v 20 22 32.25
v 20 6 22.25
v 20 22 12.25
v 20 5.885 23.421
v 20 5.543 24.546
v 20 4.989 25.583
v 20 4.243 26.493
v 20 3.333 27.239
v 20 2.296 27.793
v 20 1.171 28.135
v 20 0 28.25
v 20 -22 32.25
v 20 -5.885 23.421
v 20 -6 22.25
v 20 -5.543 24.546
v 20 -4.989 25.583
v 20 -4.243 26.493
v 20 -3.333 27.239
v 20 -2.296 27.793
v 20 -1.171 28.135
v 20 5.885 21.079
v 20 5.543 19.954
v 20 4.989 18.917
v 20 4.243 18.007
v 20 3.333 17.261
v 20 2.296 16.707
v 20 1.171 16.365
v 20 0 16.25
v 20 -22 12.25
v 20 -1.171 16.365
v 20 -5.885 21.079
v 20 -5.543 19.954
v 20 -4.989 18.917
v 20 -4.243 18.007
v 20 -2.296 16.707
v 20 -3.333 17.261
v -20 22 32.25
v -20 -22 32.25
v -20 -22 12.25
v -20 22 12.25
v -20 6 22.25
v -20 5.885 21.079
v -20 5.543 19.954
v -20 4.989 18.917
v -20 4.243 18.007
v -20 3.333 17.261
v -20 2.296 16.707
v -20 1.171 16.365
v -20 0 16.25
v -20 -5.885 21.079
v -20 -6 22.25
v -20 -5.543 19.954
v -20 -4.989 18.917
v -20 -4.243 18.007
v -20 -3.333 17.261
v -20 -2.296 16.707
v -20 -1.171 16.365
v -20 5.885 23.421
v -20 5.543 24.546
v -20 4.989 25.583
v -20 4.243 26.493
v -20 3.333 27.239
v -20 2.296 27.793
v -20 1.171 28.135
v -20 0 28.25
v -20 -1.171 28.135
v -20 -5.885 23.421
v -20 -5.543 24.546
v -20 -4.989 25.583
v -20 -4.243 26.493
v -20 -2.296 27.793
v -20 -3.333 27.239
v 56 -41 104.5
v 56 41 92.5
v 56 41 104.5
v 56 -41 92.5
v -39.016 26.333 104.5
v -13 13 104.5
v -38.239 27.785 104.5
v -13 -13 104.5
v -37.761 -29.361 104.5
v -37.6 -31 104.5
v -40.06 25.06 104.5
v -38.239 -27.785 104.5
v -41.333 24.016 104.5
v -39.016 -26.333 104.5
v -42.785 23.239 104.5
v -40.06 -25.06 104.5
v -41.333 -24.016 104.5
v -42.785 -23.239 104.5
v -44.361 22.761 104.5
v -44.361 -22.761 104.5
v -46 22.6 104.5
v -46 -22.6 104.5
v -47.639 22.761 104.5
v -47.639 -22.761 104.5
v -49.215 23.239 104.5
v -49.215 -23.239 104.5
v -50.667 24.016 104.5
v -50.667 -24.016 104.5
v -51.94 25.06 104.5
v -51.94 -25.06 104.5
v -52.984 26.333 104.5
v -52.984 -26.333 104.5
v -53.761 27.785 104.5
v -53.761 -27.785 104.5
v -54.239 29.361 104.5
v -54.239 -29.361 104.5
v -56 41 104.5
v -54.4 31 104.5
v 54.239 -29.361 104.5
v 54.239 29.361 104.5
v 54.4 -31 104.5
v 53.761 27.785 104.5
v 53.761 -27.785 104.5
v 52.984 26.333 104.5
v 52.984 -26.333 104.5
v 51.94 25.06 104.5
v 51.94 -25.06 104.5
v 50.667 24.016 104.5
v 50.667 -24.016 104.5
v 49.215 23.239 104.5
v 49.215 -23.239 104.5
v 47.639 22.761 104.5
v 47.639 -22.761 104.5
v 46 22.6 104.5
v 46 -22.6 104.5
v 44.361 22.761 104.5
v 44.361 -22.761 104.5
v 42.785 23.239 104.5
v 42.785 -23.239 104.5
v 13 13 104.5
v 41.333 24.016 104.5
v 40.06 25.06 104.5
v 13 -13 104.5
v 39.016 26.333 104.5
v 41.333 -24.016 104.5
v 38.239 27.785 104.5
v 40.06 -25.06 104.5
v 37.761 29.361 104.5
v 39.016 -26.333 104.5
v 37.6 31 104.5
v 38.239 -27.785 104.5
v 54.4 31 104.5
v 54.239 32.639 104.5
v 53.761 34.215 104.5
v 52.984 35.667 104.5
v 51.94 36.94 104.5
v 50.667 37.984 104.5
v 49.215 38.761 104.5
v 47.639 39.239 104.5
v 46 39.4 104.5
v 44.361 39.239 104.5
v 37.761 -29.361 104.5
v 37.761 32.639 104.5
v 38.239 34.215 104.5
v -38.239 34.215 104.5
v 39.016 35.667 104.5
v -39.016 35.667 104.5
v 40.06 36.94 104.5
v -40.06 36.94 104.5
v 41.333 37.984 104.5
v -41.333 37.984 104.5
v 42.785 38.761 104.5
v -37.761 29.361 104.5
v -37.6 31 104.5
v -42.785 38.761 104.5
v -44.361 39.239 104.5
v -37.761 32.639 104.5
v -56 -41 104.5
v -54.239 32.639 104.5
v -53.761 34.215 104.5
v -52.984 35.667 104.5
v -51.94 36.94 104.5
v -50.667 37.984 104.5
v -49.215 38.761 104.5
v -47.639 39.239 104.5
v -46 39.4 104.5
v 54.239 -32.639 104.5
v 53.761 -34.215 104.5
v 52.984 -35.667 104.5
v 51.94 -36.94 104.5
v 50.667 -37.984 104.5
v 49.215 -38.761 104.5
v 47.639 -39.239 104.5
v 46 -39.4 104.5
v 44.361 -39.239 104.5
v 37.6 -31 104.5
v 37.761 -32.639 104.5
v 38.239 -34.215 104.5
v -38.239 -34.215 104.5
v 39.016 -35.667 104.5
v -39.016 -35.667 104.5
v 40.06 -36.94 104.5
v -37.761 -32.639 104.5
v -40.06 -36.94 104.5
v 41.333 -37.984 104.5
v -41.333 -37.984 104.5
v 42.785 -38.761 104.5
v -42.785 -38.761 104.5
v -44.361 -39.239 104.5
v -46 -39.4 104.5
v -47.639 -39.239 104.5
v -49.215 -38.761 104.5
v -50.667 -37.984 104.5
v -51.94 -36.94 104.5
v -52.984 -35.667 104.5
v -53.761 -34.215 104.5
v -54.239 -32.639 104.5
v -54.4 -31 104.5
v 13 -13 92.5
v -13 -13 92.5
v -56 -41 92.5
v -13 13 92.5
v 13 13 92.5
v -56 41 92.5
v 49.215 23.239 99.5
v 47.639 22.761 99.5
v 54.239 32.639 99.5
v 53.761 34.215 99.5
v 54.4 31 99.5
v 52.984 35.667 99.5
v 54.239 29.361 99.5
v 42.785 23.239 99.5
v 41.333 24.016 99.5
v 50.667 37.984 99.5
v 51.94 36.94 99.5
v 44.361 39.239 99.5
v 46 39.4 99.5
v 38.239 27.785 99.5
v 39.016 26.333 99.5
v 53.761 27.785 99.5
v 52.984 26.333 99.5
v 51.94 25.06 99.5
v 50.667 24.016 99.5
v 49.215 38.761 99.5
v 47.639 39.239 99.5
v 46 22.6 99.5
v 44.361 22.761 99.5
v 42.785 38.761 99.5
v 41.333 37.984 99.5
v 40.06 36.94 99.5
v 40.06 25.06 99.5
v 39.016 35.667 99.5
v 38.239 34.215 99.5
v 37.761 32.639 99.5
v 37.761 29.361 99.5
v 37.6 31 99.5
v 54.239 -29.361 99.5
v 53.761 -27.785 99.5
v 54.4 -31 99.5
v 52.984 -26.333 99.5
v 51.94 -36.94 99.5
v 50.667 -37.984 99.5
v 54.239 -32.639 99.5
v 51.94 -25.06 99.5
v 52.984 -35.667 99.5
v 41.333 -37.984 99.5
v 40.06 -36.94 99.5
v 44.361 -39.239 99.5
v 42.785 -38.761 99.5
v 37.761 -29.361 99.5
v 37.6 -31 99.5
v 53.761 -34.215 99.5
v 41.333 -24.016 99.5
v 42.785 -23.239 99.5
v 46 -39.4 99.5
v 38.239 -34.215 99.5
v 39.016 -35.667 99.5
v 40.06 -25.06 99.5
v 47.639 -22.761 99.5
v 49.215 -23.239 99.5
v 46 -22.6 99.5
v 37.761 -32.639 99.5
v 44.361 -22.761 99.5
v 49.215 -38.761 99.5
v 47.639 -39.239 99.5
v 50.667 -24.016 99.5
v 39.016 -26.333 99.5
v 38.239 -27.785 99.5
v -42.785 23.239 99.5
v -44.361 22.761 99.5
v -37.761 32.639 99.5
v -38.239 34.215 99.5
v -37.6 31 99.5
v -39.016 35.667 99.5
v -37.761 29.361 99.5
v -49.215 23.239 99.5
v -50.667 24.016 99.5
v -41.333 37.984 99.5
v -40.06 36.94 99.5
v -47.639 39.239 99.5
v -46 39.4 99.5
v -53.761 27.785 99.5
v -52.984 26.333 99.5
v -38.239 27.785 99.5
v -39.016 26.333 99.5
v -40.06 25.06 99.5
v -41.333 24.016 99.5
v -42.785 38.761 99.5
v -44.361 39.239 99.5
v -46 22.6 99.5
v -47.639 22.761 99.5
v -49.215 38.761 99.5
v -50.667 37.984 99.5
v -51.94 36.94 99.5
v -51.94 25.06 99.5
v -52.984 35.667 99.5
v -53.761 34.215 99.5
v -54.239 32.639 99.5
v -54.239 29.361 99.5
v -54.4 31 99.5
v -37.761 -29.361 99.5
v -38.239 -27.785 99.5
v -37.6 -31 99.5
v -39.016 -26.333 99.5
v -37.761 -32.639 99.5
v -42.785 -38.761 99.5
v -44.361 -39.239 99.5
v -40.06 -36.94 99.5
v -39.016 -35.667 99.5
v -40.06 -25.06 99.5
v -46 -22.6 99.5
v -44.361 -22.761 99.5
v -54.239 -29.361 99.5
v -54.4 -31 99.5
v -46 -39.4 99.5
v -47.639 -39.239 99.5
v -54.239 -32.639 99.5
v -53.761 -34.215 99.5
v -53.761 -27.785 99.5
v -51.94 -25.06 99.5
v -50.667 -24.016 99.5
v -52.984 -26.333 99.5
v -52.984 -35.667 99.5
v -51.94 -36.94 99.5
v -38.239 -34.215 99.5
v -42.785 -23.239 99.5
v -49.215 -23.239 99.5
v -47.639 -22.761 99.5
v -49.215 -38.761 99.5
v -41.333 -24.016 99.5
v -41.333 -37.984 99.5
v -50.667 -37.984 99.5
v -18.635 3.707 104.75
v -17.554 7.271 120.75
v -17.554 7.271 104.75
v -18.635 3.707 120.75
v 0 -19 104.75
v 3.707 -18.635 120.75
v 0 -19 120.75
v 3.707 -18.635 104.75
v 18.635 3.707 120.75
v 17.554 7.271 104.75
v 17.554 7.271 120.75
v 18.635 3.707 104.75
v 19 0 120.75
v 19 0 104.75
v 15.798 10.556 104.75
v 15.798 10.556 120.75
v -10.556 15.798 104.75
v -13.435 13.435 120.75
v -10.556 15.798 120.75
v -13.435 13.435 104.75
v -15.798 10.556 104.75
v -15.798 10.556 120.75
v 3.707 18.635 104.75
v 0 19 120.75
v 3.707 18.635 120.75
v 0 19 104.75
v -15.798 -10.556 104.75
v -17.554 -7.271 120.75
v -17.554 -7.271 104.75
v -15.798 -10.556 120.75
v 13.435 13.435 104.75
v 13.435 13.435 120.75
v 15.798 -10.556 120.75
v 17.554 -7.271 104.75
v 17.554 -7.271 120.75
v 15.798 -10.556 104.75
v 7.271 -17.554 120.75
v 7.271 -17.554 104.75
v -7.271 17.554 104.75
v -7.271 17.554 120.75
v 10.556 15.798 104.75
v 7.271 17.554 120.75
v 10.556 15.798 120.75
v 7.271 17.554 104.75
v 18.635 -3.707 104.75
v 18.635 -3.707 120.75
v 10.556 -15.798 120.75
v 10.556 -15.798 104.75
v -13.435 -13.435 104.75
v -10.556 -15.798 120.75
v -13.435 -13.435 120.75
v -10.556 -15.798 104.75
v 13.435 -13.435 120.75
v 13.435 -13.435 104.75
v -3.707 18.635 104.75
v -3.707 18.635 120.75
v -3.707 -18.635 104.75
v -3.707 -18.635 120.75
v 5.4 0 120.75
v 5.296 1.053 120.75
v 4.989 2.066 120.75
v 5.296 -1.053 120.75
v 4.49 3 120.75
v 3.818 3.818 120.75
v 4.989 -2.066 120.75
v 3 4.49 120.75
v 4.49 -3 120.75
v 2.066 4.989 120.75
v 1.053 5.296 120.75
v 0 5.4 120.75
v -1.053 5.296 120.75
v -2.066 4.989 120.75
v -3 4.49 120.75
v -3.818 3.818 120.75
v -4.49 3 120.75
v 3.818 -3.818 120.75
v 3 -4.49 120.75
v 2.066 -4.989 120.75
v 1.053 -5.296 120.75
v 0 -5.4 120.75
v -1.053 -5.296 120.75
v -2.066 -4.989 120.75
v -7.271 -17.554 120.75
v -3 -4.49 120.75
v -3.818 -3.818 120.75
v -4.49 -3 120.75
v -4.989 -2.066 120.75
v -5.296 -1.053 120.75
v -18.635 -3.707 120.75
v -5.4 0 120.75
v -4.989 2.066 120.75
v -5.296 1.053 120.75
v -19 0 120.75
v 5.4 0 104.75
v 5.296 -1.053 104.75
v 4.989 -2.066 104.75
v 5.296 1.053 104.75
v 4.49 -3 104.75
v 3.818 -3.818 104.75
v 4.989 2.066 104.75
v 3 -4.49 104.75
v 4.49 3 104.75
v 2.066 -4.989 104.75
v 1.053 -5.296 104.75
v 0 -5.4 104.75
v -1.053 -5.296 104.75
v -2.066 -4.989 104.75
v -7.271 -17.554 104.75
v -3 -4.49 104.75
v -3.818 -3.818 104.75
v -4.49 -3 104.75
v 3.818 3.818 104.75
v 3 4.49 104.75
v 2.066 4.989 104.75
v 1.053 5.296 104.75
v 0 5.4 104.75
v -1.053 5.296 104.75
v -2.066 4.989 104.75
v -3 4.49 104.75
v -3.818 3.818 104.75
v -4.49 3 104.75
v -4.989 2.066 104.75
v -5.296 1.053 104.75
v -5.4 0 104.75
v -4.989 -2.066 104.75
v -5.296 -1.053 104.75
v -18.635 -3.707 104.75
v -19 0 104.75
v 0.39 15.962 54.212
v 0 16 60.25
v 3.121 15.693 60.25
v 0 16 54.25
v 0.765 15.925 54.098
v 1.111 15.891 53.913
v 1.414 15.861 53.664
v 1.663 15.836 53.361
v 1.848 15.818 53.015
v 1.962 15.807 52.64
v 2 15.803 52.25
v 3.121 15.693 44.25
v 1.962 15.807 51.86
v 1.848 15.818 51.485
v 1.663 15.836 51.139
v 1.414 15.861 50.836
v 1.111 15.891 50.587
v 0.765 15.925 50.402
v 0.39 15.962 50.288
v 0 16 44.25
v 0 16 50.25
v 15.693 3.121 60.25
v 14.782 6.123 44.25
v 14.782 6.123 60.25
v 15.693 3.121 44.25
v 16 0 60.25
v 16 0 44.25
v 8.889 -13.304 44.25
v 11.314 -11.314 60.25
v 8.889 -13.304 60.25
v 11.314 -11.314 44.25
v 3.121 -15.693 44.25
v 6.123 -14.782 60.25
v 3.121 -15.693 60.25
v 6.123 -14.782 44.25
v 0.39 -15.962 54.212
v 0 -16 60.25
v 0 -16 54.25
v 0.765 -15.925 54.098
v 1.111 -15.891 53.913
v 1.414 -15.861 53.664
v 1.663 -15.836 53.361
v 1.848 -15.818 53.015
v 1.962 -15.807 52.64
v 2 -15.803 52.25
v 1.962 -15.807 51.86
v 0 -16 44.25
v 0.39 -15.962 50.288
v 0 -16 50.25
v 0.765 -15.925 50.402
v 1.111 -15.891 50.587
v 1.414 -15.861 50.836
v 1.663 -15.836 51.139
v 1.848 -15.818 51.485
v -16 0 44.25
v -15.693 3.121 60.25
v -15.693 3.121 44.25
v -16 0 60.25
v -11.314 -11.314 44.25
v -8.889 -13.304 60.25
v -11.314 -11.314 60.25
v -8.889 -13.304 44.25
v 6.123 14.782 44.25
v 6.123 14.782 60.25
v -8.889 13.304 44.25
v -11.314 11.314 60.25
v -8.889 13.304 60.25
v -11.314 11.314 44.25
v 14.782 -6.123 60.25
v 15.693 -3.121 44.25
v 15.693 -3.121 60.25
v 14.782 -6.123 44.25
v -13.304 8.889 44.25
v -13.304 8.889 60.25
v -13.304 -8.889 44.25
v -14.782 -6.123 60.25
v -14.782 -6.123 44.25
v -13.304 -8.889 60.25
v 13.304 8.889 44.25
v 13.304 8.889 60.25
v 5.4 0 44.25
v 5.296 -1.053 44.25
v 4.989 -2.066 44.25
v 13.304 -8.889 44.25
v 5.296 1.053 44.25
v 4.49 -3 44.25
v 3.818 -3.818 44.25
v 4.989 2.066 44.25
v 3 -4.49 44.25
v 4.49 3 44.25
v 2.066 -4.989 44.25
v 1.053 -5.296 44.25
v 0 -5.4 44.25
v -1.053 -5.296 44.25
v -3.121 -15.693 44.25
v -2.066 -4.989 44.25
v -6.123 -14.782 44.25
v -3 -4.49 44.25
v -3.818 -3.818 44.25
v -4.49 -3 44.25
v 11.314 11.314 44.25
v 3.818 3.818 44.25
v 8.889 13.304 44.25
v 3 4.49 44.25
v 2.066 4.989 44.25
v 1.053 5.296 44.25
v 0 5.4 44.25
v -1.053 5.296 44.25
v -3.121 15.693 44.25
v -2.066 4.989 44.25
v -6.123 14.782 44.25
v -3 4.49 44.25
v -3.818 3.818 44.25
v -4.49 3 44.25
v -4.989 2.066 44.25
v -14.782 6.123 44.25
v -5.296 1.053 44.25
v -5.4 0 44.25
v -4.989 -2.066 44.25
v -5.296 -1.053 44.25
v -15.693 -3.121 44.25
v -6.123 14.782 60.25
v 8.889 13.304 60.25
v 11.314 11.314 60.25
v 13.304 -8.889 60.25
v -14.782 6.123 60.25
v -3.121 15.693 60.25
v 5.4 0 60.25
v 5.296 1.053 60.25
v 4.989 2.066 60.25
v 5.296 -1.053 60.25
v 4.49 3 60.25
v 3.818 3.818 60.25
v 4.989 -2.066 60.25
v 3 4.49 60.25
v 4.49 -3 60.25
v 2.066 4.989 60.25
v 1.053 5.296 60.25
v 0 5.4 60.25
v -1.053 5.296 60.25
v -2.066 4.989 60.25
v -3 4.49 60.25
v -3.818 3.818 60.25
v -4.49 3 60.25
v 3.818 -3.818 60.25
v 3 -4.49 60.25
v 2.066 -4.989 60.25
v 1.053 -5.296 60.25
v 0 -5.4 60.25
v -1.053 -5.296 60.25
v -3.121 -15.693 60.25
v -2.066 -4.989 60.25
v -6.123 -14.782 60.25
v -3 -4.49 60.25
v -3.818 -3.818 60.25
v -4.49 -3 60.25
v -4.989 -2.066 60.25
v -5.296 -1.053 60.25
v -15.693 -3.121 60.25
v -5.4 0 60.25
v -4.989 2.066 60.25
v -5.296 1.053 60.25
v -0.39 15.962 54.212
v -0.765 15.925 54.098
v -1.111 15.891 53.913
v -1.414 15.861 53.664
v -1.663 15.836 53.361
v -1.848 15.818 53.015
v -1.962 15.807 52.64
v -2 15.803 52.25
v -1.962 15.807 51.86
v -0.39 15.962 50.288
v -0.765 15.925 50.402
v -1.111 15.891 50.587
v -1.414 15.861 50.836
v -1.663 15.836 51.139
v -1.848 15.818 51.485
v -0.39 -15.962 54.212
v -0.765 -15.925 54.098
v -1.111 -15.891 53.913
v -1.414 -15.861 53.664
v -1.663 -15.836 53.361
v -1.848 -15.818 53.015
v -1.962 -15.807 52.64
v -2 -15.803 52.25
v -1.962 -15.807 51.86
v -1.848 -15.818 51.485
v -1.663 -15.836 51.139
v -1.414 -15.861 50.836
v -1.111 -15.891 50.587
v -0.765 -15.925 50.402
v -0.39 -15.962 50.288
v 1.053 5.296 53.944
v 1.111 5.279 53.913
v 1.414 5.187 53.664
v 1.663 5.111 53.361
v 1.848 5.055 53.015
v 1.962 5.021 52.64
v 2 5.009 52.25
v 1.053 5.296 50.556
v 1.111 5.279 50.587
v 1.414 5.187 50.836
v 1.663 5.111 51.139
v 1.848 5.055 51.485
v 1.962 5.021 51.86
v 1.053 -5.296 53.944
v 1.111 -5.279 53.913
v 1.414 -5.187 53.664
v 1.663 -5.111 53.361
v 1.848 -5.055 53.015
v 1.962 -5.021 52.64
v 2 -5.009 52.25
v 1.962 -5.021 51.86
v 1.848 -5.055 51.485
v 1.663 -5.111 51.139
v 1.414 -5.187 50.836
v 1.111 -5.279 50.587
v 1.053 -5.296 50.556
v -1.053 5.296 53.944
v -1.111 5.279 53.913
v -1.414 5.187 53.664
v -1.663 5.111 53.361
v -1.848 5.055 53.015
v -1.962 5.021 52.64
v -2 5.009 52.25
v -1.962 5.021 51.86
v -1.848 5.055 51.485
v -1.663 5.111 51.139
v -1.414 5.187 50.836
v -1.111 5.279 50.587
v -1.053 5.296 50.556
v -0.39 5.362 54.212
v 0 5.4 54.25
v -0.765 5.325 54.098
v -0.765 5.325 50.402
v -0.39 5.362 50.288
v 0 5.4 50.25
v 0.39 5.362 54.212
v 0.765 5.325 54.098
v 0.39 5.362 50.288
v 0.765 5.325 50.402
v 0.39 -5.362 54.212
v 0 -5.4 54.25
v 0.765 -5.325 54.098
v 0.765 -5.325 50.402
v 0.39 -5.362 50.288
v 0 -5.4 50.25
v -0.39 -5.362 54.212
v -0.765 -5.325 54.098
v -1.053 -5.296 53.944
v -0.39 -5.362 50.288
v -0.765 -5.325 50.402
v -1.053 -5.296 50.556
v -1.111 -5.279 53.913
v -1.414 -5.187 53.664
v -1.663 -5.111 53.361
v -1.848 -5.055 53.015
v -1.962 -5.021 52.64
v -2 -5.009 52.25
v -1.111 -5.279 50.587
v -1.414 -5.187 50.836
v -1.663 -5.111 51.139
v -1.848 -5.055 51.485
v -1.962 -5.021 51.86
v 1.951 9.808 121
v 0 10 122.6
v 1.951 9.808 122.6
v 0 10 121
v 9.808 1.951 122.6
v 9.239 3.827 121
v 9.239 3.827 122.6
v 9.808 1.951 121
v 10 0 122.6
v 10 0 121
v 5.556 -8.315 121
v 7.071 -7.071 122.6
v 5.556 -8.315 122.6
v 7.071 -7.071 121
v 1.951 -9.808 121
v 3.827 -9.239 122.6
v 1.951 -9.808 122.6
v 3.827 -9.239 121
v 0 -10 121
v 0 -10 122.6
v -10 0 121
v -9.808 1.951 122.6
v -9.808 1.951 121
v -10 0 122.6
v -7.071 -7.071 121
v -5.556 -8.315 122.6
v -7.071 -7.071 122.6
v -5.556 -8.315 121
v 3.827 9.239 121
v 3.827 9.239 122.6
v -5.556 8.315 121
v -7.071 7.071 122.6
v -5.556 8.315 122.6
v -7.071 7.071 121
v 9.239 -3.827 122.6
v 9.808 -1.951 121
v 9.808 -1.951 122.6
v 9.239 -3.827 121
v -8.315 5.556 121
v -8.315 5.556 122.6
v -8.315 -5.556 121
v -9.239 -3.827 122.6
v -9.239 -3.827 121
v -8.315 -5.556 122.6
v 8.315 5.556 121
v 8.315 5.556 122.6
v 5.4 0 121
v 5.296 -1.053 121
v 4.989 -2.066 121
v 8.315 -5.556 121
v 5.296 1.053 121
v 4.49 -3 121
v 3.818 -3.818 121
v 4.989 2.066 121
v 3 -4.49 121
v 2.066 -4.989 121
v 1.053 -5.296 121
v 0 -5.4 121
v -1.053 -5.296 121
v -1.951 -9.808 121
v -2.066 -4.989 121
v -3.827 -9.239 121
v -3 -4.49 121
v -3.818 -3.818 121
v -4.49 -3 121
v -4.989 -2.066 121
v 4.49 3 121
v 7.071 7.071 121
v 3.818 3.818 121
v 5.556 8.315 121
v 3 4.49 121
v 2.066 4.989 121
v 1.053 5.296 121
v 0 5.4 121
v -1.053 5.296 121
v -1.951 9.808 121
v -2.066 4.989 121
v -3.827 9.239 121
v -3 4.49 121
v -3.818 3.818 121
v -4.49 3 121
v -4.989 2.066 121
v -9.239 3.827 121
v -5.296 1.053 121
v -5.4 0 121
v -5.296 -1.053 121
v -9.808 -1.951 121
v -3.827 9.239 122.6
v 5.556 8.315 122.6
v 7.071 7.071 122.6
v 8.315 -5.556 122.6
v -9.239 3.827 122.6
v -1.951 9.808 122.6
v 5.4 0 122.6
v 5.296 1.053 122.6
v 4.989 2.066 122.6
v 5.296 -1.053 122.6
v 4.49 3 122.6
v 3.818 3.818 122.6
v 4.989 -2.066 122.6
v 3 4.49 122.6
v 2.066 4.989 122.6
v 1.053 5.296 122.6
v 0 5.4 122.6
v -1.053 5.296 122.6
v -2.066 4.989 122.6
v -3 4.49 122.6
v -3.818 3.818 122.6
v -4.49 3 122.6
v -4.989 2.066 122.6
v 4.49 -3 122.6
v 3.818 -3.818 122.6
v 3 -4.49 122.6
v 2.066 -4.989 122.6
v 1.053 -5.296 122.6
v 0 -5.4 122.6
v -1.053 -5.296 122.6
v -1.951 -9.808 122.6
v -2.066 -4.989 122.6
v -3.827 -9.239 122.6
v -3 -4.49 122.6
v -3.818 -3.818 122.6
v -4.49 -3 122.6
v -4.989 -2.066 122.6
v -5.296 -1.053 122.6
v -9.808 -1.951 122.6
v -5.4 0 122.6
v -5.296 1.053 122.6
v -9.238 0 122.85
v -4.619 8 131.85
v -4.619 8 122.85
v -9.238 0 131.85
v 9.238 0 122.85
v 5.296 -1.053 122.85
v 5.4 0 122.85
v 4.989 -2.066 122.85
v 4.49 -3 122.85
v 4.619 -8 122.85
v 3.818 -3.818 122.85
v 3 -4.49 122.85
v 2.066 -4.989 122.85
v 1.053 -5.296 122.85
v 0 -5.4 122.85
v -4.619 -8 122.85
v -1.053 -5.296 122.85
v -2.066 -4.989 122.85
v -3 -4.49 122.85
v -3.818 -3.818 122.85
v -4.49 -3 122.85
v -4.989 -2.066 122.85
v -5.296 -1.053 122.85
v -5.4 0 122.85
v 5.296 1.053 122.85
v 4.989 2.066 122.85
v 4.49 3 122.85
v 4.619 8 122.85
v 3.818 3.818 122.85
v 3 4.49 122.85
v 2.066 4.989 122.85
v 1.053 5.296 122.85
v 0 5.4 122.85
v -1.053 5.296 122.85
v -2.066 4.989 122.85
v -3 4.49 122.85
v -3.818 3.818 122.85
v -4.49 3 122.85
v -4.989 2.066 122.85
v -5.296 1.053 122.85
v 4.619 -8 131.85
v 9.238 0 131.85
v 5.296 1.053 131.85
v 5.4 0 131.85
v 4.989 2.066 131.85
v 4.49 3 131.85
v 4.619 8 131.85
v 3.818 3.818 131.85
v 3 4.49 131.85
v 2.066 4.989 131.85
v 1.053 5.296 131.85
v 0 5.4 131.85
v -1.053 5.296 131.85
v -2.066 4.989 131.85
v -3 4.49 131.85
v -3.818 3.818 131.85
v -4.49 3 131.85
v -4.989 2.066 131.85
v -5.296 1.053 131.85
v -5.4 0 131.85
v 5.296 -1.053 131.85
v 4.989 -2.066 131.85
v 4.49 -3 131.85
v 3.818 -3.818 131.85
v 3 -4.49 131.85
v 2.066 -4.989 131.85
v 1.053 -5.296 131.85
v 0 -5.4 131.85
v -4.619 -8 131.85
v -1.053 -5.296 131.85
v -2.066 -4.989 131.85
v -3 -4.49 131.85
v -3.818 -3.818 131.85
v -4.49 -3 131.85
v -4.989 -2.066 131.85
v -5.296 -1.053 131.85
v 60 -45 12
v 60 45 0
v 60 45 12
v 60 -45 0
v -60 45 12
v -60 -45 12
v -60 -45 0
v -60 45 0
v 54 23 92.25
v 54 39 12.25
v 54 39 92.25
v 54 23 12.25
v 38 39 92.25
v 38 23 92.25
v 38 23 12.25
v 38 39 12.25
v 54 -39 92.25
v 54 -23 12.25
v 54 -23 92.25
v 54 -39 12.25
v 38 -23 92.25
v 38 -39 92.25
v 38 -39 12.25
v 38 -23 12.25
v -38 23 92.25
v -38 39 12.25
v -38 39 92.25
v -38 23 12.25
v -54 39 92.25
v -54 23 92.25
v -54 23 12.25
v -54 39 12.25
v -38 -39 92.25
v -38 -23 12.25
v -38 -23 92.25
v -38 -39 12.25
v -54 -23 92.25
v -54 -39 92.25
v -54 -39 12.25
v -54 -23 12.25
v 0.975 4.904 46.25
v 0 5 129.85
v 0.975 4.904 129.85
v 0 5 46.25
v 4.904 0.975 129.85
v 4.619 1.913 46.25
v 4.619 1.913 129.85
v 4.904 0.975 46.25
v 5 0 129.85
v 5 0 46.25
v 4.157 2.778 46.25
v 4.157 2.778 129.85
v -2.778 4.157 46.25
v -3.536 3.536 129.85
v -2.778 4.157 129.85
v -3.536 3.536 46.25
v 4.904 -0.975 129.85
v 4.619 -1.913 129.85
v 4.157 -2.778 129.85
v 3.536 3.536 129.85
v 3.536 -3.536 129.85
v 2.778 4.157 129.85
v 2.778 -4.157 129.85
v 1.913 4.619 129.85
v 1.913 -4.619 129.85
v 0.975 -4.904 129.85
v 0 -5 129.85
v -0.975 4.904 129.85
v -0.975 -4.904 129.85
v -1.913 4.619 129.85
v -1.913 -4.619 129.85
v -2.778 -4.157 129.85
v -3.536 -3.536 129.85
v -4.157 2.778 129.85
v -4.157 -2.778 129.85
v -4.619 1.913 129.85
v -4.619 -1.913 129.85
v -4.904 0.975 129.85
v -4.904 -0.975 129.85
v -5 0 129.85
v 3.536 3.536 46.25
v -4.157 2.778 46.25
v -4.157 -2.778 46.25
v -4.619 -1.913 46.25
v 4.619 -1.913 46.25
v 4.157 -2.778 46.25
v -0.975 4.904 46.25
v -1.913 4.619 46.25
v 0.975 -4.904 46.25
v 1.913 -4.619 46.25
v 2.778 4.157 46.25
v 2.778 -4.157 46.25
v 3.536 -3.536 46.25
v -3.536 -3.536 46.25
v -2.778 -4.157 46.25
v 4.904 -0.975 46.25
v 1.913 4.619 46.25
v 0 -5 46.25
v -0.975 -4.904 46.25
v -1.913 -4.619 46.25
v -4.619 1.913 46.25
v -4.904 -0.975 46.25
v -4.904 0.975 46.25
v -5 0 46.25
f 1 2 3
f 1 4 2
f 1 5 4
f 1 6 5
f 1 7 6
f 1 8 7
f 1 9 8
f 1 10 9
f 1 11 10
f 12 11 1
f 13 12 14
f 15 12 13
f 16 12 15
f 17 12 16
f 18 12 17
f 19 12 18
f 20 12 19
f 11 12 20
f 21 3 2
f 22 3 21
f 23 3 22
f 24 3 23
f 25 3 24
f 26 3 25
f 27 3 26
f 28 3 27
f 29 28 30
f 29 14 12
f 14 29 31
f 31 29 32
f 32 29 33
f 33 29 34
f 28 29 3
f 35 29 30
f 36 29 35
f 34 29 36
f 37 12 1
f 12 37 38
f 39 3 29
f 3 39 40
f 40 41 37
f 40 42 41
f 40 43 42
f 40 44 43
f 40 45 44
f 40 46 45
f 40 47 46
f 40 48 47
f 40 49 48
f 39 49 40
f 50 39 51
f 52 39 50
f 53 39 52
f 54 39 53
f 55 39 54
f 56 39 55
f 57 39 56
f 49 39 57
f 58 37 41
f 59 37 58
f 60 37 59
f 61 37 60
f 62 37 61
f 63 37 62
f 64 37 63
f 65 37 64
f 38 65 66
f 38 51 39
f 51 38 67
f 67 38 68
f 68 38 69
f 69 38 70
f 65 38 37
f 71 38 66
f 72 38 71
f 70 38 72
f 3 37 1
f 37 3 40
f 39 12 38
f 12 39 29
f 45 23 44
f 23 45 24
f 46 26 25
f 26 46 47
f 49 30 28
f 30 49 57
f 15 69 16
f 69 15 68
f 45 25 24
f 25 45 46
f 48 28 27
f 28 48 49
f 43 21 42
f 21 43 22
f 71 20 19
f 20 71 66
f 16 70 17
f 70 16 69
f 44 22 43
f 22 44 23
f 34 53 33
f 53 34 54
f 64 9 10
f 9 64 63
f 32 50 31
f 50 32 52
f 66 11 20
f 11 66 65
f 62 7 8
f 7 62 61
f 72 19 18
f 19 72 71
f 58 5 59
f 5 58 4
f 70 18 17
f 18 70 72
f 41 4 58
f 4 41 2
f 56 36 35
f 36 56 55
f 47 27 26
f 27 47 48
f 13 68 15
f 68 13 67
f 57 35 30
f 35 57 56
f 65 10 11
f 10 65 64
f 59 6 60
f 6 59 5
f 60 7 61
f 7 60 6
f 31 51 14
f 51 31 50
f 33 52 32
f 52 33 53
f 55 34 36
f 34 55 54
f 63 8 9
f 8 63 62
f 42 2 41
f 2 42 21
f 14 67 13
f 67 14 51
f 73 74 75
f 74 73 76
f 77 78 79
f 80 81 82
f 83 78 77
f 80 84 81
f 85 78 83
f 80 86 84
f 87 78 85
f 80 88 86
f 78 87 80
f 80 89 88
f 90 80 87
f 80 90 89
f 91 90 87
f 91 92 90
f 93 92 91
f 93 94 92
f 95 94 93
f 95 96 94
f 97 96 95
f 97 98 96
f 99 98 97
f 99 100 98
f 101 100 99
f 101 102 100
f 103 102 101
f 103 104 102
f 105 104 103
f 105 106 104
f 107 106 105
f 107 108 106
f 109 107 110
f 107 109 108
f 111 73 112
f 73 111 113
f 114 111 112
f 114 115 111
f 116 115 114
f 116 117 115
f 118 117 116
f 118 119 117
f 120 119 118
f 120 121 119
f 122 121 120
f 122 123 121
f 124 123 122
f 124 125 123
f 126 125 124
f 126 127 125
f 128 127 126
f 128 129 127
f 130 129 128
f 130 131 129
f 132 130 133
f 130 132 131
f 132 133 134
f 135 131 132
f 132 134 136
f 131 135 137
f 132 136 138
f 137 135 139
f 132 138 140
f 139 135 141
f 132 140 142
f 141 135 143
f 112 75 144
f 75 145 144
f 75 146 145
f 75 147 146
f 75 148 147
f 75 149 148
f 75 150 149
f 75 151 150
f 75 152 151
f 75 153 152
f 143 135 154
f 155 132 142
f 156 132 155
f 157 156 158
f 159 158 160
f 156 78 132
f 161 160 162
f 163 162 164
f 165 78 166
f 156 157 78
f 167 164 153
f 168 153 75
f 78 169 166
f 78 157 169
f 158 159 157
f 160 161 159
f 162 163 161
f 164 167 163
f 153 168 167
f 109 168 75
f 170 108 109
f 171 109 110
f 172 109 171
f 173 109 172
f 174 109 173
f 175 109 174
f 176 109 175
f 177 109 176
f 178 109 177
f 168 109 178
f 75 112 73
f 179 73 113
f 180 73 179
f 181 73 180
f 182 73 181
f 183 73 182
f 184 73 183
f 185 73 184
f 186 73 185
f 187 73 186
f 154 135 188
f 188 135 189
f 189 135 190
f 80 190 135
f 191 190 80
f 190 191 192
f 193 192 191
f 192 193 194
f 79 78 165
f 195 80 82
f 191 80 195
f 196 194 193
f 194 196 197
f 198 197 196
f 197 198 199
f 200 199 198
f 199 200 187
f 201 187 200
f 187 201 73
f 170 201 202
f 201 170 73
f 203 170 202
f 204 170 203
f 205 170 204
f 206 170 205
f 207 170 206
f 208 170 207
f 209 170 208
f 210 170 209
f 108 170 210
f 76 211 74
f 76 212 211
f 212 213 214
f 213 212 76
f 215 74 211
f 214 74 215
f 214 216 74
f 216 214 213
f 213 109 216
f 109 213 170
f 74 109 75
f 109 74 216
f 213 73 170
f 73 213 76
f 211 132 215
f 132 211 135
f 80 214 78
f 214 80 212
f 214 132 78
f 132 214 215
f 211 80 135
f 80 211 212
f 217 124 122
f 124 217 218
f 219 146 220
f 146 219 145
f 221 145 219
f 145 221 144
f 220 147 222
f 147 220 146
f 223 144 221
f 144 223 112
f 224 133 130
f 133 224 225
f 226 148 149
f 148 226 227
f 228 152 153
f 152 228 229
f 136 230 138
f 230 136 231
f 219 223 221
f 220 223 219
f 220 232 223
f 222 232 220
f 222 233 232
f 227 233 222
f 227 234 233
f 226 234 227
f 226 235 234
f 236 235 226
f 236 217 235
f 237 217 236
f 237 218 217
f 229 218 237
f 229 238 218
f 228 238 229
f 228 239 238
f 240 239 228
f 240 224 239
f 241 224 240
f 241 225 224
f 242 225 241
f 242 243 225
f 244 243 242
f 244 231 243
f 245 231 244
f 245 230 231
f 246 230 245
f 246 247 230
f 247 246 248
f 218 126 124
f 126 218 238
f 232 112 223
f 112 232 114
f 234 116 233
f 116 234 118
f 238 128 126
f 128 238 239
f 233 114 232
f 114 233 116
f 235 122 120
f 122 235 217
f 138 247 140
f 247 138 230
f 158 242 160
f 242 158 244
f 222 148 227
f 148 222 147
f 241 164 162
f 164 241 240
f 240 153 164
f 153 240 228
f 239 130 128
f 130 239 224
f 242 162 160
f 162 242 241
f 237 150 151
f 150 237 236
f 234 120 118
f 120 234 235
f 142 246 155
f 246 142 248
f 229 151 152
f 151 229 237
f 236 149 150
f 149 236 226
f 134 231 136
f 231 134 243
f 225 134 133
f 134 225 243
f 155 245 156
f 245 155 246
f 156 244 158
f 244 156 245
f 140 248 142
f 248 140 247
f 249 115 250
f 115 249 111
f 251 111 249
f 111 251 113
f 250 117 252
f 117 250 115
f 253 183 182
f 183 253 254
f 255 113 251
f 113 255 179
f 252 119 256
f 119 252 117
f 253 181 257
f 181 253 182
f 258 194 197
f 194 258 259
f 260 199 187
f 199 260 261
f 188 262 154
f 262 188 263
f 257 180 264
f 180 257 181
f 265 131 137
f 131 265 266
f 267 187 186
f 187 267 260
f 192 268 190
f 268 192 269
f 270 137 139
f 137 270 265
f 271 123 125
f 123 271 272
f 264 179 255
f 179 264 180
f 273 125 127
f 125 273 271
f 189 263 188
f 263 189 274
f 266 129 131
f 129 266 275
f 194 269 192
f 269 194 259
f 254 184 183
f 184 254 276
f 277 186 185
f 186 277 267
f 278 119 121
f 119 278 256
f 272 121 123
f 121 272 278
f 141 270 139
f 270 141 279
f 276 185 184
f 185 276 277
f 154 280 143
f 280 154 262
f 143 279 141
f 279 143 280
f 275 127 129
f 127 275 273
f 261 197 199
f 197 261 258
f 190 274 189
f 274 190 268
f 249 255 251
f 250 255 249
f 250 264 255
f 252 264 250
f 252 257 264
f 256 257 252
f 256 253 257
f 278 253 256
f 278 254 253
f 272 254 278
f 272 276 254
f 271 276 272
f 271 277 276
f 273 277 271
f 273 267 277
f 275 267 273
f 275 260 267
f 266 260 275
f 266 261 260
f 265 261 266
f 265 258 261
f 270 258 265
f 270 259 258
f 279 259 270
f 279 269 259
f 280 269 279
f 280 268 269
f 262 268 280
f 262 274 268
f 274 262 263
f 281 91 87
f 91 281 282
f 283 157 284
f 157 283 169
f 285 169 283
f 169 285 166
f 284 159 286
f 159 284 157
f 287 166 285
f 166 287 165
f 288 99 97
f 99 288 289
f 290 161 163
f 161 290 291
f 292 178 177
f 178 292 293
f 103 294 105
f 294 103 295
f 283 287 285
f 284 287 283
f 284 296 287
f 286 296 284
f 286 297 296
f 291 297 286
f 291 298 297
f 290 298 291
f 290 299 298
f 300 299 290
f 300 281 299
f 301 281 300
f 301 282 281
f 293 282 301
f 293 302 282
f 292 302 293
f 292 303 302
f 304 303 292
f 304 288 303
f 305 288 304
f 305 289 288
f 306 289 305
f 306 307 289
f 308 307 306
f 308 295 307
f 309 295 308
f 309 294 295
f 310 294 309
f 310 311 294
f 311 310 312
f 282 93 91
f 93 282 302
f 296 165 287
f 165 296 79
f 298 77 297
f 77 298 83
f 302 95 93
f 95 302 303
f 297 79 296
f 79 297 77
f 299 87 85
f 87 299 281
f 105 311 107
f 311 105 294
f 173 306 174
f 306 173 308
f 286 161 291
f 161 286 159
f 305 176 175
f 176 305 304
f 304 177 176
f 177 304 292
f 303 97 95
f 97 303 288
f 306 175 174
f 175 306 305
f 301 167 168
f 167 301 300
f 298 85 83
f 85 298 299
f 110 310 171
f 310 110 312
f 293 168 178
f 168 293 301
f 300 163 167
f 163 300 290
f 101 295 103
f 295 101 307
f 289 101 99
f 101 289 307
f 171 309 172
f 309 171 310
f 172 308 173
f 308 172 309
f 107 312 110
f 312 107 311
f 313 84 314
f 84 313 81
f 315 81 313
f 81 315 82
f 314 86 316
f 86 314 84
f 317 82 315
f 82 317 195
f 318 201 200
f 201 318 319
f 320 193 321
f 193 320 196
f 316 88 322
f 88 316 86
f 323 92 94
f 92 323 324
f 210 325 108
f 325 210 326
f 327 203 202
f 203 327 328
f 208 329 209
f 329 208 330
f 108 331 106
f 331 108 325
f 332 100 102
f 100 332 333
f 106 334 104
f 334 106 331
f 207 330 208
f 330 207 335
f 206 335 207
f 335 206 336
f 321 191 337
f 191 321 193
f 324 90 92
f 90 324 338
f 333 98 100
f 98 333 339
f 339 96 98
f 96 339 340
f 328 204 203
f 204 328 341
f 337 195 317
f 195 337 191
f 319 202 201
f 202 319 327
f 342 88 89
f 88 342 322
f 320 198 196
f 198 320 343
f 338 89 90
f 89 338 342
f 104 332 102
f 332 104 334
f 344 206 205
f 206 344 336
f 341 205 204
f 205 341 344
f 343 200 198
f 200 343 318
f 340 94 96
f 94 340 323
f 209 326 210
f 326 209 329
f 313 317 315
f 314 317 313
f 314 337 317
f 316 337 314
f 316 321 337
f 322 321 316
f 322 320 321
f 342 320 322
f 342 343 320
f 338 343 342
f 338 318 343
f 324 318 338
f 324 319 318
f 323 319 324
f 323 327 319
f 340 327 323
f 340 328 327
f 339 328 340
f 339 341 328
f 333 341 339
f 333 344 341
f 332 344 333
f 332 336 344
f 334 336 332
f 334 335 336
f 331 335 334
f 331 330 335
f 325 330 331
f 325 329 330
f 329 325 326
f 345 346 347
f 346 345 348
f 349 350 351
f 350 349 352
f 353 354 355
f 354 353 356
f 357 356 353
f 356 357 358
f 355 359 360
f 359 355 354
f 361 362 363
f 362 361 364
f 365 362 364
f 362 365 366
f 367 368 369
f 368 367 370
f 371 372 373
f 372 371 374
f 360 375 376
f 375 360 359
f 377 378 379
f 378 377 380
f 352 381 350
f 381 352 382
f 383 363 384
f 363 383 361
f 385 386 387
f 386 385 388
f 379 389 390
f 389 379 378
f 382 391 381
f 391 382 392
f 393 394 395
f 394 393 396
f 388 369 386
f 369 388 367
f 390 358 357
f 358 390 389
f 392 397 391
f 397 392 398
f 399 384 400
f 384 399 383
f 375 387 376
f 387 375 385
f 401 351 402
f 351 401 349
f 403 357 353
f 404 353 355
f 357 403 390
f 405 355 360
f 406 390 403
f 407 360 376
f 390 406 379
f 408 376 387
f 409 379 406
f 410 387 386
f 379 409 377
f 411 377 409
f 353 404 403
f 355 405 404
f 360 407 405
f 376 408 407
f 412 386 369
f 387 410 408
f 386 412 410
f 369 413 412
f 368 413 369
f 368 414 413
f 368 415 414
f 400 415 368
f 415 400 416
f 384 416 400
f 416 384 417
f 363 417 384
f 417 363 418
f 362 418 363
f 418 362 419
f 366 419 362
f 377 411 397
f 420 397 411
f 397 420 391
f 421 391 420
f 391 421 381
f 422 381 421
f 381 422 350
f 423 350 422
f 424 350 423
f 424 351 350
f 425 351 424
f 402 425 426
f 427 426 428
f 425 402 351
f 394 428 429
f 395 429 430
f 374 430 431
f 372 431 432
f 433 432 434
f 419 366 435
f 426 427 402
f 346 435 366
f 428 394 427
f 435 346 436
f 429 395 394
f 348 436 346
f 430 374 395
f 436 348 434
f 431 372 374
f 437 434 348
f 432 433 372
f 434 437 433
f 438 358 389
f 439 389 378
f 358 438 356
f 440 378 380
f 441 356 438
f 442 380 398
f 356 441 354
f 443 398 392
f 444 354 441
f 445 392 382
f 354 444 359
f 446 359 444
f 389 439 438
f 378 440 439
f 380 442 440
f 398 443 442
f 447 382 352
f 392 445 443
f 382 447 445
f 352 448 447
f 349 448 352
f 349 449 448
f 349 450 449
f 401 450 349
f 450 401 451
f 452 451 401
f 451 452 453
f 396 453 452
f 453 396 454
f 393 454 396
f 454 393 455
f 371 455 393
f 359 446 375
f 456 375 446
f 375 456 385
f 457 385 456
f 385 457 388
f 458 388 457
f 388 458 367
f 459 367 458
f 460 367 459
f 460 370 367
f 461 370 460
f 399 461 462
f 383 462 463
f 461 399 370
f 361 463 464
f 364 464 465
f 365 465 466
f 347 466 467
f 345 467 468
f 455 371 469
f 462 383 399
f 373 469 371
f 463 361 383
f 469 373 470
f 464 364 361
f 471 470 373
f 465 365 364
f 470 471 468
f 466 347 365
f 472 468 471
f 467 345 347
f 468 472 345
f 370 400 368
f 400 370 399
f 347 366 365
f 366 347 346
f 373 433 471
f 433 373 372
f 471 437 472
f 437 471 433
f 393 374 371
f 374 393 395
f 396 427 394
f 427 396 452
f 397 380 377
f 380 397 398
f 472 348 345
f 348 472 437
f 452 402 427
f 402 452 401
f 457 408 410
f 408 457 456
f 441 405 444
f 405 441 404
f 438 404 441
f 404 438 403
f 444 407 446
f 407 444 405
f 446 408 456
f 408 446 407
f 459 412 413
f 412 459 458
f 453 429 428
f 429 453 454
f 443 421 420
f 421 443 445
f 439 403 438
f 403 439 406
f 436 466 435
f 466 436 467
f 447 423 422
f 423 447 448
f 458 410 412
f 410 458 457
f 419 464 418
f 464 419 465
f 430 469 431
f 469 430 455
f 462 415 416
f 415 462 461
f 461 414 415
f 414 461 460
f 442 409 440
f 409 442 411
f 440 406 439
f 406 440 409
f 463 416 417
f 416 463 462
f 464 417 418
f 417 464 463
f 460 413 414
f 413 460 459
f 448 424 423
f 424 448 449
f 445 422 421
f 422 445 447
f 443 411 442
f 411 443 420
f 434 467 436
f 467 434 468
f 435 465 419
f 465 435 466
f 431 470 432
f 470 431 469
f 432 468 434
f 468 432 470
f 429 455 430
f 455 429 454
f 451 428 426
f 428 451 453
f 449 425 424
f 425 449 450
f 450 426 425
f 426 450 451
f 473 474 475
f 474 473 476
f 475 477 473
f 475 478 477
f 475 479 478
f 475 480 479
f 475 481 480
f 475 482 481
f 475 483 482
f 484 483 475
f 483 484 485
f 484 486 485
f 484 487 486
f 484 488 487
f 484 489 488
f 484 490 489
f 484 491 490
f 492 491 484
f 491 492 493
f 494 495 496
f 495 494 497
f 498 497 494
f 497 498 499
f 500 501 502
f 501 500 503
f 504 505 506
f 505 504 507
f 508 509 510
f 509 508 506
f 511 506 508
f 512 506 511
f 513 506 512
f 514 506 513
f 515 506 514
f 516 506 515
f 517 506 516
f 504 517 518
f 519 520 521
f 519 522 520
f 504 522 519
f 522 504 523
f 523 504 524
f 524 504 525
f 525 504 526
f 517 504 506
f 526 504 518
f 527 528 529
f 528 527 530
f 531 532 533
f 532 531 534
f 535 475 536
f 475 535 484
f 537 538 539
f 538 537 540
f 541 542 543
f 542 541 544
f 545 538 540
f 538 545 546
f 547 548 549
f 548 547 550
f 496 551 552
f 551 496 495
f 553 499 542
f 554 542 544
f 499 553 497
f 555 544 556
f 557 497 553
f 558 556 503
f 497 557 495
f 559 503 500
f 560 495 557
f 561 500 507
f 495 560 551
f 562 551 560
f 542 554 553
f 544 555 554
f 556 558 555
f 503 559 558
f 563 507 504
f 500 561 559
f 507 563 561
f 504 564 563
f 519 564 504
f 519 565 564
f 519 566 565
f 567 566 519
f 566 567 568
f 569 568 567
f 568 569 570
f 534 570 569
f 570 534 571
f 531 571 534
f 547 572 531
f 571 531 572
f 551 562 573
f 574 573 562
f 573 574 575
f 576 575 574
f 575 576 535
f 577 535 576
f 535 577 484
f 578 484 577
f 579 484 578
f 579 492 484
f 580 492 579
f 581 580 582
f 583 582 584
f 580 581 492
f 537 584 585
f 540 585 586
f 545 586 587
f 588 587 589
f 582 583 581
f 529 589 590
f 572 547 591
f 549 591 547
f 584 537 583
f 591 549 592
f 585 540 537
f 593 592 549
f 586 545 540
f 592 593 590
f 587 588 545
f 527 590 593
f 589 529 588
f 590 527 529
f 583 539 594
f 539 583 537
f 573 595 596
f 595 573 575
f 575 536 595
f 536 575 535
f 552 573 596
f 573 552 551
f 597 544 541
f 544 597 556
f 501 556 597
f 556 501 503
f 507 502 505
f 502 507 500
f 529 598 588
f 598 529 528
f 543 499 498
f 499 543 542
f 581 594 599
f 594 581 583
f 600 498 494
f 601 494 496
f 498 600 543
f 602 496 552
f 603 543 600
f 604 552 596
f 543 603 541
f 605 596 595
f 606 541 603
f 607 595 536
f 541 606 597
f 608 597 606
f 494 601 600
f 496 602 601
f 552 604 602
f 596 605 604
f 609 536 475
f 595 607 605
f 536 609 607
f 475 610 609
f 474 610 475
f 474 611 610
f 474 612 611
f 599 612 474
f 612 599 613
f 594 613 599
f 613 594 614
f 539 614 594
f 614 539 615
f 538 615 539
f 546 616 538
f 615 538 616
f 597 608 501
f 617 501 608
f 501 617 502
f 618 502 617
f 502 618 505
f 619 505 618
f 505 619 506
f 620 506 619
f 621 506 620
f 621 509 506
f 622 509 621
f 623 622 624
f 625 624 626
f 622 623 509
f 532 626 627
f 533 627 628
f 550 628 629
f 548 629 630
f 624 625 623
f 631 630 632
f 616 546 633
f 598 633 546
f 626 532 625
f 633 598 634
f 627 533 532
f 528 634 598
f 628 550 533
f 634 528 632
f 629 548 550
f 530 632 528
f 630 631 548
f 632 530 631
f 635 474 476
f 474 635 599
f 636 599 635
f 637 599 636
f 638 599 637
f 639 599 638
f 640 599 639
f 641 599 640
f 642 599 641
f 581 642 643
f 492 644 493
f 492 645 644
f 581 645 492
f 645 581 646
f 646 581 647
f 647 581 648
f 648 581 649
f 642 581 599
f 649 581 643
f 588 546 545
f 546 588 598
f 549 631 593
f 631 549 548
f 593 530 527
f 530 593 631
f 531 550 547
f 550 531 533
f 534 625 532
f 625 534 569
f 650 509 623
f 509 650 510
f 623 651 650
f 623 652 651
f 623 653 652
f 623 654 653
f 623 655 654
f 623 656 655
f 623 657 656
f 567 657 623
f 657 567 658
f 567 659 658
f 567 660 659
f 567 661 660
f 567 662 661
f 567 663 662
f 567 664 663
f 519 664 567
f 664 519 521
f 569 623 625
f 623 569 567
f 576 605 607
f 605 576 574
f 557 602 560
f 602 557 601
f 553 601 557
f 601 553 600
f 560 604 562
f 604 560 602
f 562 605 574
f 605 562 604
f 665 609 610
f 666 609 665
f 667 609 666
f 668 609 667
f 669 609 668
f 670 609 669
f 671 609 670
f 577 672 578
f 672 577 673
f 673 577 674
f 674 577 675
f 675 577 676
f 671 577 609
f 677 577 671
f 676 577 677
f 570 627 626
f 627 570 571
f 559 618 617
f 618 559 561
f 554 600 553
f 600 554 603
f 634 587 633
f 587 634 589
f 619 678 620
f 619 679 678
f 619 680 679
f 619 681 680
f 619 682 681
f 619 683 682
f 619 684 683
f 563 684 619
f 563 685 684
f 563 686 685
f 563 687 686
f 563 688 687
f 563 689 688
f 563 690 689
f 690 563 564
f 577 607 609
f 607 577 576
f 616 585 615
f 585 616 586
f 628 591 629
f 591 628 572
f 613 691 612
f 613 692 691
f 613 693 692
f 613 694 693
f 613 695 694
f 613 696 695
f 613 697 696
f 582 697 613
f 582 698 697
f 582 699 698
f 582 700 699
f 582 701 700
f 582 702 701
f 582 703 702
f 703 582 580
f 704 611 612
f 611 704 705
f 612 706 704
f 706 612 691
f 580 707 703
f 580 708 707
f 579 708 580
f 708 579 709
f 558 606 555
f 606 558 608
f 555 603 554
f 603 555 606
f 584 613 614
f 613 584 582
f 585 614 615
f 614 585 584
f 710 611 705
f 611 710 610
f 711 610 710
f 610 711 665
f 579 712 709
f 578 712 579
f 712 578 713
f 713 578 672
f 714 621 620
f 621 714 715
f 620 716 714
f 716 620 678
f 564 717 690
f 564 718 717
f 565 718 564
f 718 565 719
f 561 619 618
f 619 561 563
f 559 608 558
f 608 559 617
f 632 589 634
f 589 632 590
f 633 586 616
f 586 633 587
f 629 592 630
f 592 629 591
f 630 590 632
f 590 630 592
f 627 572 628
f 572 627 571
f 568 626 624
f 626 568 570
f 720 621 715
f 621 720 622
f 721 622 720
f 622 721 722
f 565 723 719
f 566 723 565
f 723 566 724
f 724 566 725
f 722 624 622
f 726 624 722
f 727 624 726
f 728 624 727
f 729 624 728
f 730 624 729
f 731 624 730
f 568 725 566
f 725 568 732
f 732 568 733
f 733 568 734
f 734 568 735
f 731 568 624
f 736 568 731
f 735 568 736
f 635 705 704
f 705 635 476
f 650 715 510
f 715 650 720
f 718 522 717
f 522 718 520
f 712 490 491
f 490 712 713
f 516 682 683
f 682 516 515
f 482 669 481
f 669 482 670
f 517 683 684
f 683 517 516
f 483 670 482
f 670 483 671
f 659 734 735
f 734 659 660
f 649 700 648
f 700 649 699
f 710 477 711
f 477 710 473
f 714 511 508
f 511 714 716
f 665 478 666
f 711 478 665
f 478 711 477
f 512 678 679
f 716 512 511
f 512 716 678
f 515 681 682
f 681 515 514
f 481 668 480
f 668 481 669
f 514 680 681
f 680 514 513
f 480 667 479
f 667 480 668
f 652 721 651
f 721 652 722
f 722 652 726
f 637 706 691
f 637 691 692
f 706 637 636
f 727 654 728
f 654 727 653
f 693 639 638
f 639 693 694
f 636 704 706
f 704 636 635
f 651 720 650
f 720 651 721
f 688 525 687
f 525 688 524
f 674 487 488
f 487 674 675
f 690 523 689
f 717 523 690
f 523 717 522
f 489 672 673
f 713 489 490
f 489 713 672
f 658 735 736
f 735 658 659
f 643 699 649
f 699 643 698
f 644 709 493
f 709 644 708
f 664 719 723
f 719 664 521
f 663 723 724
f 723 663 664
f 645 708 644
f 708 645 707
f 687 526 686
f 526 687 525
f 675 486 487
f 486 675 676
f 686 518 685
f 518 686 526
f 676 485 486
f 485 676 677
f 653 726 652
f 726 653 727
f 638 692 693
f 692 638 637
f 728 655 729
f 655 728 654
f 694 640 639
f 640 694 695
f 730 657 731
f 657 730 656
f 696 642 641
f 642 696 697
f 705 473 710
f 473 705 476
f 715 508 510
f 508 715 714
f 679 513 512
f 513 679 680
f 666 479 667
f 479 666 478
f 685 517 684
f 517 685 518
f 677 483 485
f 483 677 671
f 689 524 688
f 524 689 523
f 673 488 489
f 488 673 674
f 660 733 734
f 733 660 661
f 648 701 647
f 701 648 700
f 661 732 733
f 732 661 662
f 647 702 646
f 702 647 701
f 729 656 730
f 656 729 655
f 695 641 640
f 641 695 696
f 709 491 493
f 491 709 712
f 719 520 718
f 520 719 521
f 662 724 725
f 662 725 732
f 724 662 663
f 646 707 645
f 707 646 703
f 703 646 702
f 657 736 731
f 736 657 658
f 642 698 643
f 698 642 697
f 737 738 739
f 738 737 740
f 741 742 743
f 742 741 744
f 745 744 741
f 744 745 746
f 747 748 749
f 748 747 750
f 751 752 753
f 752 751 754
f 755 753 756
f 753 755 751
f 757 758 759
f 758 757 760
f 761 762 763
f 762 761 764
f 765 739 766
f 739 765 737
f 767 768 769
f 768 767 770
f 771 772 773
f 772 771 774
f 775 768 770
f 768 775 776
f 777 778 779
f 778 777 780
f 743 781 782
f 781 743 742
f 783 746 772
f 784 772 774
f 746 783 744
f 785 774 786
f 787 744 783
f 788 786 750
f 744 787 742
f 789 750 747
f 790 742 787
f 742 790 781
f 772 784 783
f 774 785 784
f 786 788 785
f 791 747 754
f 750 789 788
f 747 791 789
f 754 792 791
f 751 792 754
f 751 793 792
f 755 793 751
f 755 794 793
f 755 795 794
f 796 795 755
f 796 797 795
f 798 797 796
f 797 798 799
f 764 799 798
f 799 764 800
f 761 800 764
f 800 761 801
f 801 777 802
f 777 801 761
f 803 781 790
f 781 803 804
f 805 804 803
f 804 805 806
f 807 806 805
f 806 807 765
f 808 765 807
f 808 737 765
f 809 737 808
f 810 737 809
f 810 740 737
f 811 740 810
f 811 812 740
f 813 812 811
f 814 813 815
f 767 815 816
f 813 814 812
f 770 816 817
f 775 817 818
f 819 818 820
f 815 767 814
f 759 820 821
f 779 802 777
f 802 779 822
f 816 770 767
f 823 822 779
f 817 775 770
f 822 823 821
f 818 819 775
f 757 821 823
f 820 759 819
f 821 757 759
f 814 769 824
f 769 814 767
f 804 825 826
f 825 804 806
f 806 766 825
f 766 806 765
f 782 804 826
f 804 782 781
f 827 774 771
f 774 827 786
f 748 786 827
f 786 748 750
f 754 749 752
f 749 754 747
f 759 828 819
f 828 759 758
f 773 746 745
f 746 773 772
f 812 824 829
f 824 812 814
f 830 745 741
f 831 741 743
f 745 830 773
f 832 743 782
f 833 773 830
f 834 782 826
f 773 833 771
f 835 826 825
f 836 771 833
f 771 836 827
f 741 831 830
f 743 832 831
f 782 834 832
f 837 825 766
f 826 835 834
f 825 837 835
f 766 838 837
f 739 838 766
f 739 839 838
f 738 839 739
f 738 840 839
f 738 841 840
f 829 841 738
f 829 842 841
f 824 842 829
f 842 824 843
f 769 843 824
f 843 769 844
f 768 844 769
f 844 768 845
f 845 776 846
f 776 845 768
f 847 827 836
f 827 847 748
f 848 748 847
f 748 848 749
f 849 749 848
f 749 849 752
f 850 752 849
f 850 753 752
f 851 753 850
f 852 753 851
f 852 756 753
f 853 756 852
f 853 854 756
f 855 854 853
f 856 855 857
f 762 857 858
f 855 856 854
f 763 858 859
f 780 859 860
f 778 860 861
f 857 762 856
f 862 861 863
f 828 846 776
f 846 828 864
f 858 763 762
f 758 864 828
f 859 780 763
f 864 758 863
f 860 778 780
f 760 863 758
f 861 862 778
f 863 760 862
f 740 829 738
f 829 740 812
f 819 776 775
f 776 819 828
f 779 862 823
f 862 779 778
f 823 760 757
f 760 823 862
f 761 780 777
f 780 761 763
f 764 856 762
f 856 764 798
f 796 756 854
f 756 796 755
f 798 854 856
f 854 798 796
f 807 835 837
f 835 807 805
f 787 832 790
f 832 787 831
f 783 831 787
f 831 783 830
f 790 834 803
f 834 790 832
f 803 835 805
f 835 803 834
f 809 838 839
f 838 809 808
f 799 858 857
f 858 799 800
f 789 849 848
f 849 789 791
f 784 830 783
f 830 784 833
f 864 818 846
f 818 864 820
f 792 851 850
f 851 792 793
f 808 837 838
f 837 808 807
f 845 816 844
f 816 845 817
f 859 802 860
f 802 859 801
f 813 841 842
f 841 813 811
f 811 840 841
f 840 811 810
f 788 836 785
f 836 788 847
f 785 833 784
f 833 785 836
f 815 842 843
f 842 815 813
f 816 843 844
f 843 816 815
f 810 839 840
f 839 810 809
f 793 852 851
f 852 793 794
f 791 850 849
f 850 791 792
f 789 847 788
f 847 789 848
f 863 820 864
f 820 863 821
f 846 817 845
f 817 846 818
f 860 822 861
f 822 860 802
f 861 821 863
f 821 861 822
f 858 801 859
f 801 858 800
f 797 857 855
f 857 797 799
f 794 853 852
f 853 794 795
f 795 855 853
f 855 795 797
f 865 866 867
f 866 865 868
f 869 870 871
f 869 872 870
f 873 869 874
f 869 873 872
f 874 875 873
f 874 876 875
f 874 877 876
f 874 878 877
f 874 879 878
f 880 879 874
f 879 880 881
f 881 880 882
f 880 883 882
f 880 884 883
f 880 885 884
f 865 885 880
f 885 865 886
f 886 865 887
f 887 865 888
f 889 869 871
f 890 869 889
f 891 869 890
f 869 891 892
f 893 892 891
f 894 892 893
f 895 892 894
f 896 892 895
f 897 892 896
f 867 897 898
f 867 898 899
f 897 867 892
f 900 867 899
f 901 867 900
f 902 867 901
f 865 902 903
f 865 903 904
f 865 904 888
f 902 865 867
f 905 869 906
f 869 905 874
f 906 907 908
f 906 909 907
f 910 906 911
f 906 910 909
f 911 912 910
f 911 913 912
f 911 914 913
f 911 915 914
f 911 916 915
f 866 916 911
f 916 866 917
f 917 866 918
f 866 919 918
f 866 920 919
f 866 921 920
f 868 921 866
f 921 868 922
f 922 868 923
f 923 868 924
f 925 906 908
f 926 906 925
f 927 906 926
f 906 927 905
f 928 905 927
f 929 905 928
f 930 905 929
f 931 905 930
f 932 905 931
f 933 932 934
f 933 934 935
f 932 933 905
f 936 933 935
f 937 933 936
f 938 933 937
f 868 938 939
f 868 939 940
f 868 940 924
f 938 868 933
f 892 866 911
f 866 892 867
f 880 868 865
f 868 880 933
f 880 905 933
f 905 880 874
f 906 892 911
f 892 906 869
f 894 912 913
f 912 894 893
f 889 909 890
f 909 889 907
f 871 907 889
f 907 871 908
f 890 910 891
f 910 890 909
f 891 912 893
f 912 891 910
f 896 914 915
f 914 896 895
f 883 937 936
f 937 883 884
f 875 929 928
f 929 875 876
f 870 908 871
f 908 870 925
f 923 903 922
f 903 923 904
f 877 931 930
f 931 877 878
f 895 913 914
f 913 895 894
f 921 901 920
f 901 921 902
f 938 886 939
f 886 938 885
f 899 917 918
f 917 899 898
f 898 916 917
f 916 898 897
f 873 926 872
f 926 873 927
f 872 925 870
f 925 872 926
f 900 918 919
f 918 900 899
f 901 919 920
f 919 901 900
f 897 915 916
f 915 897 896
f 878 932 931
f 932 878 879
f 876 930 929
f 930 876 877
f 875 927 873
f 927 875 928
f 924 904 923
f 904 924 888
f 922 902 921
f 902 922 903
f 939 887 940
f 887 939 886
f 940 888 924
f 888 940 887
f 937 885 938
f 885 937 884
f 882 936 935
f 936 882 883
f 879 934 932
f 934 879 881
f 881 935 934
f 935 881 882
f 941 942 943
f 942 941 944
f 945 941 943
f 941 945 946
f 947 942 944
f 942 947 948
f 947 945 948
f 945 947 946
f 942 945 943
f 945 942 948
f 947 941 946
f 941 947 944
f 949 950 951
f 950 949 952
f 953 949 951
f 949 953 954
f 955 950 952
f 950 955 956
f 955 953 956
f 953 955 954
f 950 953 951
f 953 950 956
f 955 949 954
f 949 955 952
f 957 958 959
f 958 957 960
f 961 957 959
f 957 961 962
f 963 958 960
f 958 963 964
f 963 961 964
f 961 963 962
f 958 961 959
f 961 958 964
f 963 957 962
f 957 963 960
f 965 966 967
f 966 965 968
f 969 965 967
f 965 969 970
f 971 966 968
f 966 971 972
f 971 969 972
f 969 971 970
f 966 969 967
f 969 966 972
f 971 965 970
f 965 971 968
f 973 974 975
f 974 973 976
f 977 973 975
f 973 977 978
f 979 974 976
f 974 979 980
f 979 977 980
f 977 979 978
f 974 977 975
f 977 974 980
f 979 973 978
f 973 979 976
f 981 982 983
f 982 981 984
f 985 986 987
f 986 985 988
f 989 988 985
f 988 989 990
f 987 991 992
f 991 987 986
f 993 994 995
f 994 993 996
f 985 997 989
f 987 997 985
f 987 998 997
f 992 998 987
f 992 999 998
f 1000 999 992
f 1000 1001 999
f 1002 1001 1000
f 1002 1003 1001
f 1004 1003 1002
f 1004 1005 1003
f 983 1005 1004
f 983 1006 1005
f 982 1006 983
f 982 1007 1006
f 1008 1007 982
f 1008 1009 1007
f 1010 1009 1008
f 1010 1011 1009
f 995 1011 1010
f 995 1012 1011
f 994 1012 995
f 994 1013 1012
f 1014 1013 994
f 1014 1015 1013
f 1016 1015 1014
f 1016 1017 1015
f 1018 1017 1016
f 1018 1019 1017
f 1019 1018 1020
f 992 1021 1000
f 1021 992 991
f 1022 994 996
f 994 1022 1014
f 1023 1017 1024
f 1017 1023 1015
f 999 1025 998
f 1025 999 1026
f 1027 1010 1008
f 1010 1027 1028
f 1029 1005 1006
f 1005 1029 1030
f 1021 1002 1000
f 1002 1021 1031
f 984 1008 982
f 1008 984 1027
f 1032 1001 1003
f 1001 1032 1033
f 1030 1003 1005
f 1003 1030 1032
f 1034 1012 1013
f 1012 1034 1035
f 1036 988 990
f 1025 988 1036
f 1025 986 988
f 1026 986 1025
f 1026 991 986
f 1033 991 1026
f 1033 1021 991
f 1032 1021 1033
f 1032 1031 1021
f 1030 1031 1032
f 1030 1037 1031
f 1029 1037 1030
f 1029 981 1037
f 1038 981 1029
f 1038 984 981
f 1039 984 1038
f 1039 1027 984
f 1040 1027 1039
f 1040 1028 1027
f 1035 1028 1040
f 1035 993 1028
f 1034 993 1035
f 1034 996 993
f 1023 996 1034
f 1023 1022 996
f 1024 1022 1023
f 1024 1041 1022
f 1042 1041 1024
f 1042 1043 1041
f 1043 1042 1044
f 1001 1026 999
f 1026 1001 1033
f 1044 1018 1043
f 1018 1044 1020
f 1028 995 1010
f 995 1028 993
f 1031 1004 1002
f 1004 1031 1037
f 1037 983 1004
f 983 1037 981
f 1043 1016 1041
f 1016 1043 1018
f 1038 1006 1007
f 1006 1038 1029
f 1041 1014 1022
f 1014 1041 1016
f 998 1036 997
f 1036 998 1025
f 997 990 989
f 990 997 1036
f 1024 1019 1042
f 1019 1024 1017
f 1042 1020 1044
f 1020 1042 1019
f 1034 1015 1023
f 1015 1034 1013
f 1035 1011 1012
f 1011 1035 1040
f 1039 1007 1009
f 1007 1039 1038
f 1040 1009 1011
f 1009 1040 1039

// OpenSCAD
$fn = 32;

// ------------------------------------------------------------------------
// Arbor press fixture: screw d10, posts 80 mm, gap 12 mm
// Every part is its own module, assembly() places every instance.
// ------------------------------------------------------------------------

// --- part 1 ---
module press_bed() {
  difference() {
    translate([-60, -45, 0]) cube([120, 90, 12]);
  }
}

// --- part 2 ---
module anvil_block() {
  difference() {
    translate([-20, -22, 0]) cube([40, 44, 20]);
    translate([0, 0, 10]) rotate([0, 90, 0]) cylinder(h = 42, d = 12, center = true);
  }
}

// --- part 3 ---
module press_post_a() {
  translate([-8, -8, 0]) cube([16, 16, 80]);
}

// --- part 4 ---
module press_post_b() {
  translate([-8, -8, 0]) cube([16, 16, 80]);
}

// --- part 5 ---
module press_post_c() {
  translate([-8, -8, 0]) cube([16, 16, 80]);
}

// --- part 6 ---
module press_post_d() {
  translate([-8, -8, 0]) cube([16, 16, 80]);
}

// --- part 7 ---
module press_frame() {
  difference() {
    translate([-56, -41, 0]) cube([112, 82, 12]);
    translate([-13, -13, -1]) cube([26, 26, 14]);
    translate([46, 31, 7]) cylinder(h = 6, d = 16.8);
    translate([46, -31, 7]) cylinder(h = 6, d = 16.8);
    translate([-46, 31, 7]) cylinder(h = 6, d = 16.8);
    translate([-46, -31, 7]) cylinder(h = 6, d = 16.8);
  }
}

// --- part 8 ---
module guide_ring() {
  difference() {
      translate([0, 0, 0]) cylinder(h = 16, d = 38);
      translate([0, 0, -1]) cylinder(h = 18, d = 10.8);
    }
}

// --- part 9 ---
module press_screw() {
  translate([0, 0, -41.8]) cylinder(h = 83.6, d = 10);
}

// --- part 10 ---
module press_head() {
  difference() {
    cylinder(h = 16, d = 32);
    translate([0, 0, -1]) cylinder(h = 18, d = 10.8);
    translate([0, 0, 8]) rotate([90, 0, 0]) cylinder(h = 34, d = 4, center = true);
  }
}

// --- part 11 ---
module nut_washer() {
  difference() {
      translate([0, 0, 0]) cylinder(h = 1.6, d = 20);
      translate([0, 0, -1]) cylinder(h = 3.6, d = 10.8);
    }
}

// --- part 12 ---
module press_nut() {
  difference() {
    linear_extrude(height = 9) polygon(points = [[9.238, 0], [4.619, 8], [-4.619, 8], [-9.238, 0], [-4.619, -8], [4.619, -8]]);
    translate([0, 0, -1]) cylinder(h = 11, d = 10.8);
  }
}

// --- assembly ---
module assembly() {
  color([0.80, 0.24, 0.20]) translate([0, 0, 0]) rotate([0, 0, 0]) press_bed();
  color([0.20, 0.45, 0.75]) translate([0, 0, 12.25]) rotate([0, 0, 0]) anvil_block();
  color([0.25, 0.62, 0.32]) translate([46, 31, 12.25]) rotate([0, 0, 0]) press_post_a();
  color([0.92, 0.70, 0.18]) translate([46, -31, 12.25]) rotate([0, 0, 0]) press_post_b();
  color([0.58, 0.35, 0.70]) translate([-46, 31, 12.25]) rotate([0, 0, 0]) press_post_c();
  color([0.16, 0.66, 0.66]) translate([-46, -31, 12.25]) rotate([0, 0, 0]) press_post_d();
  color([0.85, 0.48, 0.18]) translate([0, 0, 92.5]) rotate([0, 0, 0]) press_frame();
  color([0.55, 0.60, 0.65]) translate([0, 0, 104.75]) rotate([0, 0, 0]) guide_ring();
  color([0.75, 0.30, 0.55]) translate([0, 0, 88.05]) rotate([0, 0, 0]) press_screw();
  color([0.42, 0.52, 0.28]) translate([0, 0, 44.25]) rotate([0, 0, 0]) press_head();
  color([0.80, 0.24, 0.20]) translate([0, 0, 121]) rotate([0, 0, 0]) nut_washer();
  color([0.20, 0.45, 0.75]) translate([0, 0, 122.85]) rotate([0, 0, 0]) press_nut();
}

assembly();
